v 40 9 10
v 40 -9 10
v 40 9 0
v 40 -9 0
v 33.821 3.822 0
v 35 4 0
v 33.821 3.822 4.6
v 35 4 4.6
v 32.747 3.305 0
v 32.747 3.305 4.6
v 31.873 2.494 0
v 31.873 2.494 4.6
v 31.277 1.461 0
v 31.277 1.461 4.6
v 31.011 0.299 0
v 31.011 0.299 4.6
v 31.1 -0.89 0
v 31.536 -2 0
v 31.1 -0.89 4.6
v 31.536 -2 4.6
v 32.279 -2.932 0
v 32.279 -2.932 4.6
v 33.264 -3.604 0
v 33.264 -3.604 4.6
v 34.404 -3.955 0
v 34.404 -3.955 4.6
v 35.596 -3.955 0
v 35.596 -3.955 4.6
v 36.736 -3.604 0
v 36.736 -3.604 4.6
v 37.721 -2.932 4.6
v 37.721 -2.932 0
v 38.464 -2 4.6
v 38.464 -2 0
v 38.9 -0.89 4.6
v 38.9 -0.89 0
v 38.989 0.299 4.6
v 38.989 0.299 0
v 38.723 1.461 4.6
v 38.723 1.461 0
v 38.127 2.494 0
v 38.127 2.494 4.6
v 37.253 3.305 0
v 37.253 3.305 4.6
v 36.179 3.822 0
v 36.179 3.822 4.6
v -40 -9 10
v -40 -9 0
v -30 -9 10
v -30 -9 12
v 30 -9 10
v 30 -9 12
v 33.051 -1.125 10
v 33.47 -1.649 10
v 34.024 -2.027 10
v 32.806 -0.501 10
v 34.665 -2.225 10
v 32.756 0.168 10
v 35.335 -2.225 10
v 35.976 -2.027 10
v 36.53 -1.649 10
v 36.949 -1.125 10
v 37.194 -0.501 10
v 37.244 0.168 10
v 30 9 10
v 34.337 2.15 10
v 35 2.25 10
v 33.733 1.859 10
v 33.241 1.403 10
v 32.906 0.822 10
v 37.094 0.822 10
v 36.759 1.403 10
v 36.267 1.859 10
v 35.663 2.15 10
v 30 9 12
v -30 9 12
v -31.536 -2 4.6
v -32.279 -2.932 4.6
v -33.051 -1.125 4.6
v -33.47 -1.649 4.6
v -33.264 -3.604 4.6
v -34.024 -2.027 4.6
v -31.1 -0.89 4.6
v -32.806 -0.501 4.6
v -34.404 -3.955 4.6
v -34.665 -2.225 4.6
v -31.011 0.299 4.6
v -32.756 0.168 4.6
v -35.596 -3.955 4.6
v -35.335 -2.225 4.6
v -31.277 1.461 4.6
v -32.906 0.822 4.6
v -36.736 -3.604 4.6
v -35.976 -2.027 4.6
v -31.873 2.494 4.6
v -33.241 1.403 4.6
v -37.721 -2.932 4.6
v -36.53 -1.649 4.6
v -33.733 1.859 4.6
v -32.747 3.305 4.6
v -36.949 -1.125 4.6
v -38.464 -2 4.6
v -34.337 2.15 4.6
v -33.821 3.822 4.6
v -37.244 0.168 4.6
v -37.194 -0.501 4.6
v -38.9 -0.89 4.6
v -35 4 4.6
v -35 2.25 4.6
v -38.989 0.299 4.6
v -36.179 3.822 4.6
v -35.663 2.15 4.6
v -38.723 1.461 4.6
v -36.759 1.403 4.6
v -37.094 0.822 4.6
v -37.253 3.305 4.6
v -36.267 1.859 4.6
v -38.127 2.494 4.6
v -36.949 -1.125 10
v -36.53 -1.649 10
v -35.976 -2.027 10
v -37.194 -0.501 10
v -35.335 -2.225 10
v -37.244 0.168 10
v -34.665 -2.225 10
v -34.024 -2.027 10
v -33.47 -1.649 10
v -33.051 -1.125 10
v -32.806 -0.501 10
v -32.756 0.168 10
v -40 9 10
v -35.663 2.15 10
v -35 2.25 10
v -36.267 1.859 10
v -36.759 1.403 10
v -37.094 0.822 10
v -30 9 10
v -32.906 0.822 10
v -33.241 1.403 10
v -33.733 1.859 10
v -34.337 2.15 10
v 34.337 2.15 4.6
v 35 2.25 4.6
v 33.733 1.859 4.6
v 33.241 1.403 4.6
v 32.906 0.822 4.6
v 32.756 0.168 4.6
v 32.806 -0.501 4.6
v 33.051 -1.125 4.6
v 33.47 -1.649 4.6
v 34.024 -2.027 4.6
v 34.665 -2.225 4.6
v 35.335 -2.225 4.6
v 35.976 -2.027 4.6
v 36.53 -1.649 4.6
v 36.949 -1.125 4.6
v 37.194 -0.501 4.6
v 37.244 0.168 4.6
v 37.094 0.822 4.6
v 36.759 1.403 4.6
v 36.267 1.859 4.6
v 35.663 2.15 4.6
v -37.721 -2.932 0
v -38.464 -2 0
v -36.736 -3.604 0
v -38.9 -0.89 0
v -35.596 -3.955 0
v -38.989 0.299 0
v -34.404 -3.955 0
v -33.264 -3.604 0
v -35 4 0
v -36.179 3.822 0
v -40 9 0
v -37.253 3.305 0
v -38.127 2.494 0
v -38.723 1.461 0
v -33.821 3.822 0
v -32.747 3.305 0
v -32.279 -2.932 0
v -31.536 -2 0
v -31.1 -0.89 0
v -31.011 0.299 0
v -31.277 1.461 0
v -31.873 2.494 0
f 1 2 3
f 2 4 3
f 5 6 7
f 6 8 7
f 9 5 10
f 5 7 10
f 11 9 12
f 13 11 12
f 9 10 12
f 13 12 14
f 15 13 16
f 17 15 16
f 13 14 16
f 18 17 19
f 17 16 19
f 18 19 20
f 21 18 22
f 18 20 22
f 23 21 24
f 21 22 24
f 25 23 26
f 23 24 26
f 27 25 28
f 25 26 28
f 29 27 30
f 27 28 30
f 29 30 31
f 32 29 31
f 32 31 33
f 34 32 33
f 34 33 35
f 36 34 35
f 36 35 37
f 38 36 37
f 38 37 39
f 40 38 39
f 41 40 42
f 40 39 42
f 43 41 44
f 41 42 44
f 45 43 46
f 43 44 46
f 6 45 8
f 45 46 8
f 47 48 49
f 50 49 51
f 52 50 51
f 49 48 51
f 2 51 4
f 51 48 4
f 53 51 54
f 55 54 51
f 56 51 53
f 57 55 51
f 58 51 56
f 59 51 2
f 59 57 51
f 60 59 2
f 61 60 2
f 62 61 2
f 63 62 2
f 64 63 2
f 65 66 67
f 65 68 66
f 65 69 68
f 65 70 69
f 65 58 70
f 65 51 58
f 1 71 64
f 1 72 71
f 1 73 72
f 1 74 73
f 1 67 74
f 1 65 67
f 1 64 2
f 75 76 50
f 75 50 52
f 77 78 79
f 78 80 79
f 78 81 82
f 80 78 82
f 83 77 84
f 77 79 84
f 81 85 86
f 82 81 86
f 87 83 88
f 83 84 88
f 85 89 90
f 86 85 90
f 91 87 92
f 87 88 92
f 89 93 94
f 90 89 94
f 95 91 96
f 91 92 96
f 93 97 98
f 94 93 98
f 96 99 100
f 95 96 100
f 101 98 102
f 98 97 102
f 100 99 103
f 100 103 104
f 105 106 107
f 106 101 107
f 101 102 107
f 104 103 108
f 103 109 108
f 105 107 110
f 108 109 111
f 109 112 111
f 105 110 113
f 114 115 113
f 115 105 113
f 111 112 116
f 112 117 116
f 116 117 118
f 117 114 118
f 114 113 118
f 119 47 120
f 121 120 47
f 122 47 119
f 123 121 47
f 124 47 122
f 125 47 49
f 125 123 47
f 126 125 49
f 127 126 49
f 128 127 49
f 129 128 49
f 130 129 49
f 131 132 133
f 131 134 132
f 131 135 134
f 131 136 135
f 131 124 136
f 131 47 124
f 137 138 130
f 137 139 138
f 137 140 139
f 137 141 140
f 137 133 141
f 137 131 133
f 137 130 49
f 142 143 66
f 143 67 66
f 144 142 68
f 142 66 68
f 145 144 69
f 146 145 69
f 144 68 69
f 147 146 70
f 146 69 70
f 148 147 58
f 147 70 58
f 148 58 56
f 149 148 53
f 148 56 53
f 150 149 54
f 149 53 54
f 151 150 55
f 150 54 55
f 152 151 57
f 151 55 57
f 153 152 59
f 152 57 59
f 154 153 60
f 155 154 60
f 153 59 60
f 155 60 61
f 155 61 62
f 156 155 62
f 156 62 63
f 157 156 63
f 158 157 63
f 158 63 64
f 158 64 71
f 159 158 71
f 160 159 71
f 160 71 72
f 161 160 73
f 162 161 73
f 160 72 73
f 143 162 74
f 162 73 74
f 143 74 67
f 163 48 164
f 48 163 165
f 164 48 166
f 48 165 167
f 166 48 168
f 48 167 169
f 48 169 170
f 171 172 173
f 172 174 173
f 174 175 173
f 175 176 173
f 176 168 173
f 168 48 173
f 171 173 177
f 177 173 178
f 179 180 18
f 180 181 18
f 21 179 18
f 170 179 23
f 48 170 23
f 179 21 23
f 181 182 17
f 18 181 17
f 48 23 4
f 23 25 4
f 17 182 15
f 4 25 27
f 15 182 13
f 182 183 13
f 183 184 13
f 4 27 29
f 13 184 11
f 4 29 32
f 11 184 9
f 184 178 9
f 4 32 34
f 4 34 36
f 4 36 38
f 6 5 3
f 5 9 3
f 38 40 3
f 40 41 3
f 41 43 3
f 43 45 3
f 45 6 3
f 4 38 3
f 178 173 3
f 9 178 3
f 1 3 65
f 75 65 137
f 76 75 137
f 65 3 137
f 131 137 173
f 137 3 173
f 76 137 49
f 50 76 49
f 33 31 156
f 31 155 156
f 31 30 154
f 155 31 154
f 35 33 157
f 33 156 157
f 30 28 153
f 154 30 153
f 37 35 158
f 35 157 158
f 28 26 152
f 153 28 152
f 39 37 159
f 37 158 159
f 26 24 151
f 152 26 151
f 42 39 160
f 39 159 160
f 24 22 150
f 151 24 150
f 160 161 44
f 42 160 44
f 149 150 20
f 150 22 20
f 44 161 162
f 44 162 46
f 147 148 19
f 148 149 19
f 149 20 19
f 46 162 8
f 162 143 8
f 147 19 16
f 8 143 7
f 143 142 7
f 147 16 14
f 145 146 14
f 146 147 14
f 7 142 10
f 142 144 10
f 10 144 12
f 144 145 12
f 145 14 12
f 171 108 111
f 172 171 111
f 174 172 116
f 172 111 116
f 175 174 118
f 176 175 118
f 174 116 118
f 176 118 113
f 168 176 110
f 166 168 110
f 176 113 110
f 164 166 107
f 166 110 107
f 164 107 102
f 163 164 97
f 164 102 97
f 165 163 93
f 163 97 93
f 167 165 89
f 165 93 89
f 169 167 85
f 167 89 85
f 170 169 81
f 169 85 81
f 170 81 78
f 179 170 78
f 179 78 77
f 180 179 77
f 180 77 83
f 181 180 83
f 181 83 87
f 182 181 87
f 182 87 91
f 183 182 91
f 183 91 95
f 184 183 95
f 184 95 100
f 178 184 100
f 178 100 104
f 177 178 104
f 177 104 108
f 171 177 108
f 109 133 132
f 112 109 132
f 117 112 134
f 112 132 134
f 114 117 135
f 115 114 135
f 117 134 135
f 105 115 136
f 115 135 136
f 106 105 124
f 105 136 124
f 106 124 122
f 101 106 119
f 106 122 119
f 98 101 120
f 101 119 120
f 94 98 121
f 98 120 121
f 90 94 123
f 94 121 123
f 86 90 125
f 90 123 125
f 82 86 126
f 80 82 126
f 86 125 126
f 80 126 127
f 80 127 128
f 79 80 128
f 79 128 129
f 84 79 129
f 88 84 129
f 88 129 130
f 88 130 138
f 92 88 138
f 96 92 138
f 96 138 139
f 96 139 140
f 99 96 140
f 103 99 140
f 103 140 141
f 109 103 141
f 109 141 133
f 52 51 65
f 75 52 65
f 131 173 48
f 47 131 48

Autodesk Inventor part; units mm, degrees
ref_plane "YZ Plane" through (0, 0, 0) normal (1, 0, 0) x (0, 1, 0)
ref_plane "XZ Plane" through (0, 0, 0) normal (0, 1, 0) x (-1, 0, 0)
ref_plane "XY Plane" through (0, 0, 0) normal (0, 0, 1) x (1, 0, 0)
sketch "Skizze1" plane through (0, 0, 0) normal (0, 0, 1) x (1, 0, 0)
  line L0 (-40, -9) -> (40, -9)
  line L1 (40, -9) -> (40, 9)
  line L2 (40, 9) -> (-40, 9)
  line L3 (-40, 9) -> (-40, -9)
  line L4 (-40, -9) -> (40, 9) construction
  line L5 (40, -9) -> (-40, 9) construction
  point P0 (0, 0)
  dimension "Breite" = 80
  dimension "Höhe" = 18
extrude "Extrusion1" add sketch "Skizze1" along normal blind 10
sketch "Skizze2" plane through (0, 0, 10) normal (0, 0, 1) x (1, 0, 0)
  line L0 (40, 9) -> (-40, 9) projected
  line L1 (-30, -9) -> (30, -9)
  line L2 (30, -9) -> (30, 9)
  line L3 (30, 9) -> (-30, 9)
  line L4 (-30, 9) -> (-30, -9)
  line L5 (-30, -9) -> (30, 9) construction
  line L6 (30, -9) -> (-30, 9) construction
  point P0 (0, 0)
  dimension "Breite_ObererKasten" = 60
extrude "Extrusion2" add sketch "Skizze2" along normal blind 2
sketch "Skizze3" plane through (0, 0, 0) normal (0, 0, -1) x (-1, 0, 0)
  line L0 (0, -12.6) -> (0, 12.6) projected
  point P0 (0, 0)
  point P1 (-35, 0)
  point P2 (35, 0)
  dimension "Abstand_Bohrung" = 70
hole "Bohrung1" at (35, 0, 0) at (-35, 0, 0) direction (0, 0, 1) diameter 4.5 end through all counterbore diameter 8 counterbore depth 4.6
properties part number "ABI_Kasten"
